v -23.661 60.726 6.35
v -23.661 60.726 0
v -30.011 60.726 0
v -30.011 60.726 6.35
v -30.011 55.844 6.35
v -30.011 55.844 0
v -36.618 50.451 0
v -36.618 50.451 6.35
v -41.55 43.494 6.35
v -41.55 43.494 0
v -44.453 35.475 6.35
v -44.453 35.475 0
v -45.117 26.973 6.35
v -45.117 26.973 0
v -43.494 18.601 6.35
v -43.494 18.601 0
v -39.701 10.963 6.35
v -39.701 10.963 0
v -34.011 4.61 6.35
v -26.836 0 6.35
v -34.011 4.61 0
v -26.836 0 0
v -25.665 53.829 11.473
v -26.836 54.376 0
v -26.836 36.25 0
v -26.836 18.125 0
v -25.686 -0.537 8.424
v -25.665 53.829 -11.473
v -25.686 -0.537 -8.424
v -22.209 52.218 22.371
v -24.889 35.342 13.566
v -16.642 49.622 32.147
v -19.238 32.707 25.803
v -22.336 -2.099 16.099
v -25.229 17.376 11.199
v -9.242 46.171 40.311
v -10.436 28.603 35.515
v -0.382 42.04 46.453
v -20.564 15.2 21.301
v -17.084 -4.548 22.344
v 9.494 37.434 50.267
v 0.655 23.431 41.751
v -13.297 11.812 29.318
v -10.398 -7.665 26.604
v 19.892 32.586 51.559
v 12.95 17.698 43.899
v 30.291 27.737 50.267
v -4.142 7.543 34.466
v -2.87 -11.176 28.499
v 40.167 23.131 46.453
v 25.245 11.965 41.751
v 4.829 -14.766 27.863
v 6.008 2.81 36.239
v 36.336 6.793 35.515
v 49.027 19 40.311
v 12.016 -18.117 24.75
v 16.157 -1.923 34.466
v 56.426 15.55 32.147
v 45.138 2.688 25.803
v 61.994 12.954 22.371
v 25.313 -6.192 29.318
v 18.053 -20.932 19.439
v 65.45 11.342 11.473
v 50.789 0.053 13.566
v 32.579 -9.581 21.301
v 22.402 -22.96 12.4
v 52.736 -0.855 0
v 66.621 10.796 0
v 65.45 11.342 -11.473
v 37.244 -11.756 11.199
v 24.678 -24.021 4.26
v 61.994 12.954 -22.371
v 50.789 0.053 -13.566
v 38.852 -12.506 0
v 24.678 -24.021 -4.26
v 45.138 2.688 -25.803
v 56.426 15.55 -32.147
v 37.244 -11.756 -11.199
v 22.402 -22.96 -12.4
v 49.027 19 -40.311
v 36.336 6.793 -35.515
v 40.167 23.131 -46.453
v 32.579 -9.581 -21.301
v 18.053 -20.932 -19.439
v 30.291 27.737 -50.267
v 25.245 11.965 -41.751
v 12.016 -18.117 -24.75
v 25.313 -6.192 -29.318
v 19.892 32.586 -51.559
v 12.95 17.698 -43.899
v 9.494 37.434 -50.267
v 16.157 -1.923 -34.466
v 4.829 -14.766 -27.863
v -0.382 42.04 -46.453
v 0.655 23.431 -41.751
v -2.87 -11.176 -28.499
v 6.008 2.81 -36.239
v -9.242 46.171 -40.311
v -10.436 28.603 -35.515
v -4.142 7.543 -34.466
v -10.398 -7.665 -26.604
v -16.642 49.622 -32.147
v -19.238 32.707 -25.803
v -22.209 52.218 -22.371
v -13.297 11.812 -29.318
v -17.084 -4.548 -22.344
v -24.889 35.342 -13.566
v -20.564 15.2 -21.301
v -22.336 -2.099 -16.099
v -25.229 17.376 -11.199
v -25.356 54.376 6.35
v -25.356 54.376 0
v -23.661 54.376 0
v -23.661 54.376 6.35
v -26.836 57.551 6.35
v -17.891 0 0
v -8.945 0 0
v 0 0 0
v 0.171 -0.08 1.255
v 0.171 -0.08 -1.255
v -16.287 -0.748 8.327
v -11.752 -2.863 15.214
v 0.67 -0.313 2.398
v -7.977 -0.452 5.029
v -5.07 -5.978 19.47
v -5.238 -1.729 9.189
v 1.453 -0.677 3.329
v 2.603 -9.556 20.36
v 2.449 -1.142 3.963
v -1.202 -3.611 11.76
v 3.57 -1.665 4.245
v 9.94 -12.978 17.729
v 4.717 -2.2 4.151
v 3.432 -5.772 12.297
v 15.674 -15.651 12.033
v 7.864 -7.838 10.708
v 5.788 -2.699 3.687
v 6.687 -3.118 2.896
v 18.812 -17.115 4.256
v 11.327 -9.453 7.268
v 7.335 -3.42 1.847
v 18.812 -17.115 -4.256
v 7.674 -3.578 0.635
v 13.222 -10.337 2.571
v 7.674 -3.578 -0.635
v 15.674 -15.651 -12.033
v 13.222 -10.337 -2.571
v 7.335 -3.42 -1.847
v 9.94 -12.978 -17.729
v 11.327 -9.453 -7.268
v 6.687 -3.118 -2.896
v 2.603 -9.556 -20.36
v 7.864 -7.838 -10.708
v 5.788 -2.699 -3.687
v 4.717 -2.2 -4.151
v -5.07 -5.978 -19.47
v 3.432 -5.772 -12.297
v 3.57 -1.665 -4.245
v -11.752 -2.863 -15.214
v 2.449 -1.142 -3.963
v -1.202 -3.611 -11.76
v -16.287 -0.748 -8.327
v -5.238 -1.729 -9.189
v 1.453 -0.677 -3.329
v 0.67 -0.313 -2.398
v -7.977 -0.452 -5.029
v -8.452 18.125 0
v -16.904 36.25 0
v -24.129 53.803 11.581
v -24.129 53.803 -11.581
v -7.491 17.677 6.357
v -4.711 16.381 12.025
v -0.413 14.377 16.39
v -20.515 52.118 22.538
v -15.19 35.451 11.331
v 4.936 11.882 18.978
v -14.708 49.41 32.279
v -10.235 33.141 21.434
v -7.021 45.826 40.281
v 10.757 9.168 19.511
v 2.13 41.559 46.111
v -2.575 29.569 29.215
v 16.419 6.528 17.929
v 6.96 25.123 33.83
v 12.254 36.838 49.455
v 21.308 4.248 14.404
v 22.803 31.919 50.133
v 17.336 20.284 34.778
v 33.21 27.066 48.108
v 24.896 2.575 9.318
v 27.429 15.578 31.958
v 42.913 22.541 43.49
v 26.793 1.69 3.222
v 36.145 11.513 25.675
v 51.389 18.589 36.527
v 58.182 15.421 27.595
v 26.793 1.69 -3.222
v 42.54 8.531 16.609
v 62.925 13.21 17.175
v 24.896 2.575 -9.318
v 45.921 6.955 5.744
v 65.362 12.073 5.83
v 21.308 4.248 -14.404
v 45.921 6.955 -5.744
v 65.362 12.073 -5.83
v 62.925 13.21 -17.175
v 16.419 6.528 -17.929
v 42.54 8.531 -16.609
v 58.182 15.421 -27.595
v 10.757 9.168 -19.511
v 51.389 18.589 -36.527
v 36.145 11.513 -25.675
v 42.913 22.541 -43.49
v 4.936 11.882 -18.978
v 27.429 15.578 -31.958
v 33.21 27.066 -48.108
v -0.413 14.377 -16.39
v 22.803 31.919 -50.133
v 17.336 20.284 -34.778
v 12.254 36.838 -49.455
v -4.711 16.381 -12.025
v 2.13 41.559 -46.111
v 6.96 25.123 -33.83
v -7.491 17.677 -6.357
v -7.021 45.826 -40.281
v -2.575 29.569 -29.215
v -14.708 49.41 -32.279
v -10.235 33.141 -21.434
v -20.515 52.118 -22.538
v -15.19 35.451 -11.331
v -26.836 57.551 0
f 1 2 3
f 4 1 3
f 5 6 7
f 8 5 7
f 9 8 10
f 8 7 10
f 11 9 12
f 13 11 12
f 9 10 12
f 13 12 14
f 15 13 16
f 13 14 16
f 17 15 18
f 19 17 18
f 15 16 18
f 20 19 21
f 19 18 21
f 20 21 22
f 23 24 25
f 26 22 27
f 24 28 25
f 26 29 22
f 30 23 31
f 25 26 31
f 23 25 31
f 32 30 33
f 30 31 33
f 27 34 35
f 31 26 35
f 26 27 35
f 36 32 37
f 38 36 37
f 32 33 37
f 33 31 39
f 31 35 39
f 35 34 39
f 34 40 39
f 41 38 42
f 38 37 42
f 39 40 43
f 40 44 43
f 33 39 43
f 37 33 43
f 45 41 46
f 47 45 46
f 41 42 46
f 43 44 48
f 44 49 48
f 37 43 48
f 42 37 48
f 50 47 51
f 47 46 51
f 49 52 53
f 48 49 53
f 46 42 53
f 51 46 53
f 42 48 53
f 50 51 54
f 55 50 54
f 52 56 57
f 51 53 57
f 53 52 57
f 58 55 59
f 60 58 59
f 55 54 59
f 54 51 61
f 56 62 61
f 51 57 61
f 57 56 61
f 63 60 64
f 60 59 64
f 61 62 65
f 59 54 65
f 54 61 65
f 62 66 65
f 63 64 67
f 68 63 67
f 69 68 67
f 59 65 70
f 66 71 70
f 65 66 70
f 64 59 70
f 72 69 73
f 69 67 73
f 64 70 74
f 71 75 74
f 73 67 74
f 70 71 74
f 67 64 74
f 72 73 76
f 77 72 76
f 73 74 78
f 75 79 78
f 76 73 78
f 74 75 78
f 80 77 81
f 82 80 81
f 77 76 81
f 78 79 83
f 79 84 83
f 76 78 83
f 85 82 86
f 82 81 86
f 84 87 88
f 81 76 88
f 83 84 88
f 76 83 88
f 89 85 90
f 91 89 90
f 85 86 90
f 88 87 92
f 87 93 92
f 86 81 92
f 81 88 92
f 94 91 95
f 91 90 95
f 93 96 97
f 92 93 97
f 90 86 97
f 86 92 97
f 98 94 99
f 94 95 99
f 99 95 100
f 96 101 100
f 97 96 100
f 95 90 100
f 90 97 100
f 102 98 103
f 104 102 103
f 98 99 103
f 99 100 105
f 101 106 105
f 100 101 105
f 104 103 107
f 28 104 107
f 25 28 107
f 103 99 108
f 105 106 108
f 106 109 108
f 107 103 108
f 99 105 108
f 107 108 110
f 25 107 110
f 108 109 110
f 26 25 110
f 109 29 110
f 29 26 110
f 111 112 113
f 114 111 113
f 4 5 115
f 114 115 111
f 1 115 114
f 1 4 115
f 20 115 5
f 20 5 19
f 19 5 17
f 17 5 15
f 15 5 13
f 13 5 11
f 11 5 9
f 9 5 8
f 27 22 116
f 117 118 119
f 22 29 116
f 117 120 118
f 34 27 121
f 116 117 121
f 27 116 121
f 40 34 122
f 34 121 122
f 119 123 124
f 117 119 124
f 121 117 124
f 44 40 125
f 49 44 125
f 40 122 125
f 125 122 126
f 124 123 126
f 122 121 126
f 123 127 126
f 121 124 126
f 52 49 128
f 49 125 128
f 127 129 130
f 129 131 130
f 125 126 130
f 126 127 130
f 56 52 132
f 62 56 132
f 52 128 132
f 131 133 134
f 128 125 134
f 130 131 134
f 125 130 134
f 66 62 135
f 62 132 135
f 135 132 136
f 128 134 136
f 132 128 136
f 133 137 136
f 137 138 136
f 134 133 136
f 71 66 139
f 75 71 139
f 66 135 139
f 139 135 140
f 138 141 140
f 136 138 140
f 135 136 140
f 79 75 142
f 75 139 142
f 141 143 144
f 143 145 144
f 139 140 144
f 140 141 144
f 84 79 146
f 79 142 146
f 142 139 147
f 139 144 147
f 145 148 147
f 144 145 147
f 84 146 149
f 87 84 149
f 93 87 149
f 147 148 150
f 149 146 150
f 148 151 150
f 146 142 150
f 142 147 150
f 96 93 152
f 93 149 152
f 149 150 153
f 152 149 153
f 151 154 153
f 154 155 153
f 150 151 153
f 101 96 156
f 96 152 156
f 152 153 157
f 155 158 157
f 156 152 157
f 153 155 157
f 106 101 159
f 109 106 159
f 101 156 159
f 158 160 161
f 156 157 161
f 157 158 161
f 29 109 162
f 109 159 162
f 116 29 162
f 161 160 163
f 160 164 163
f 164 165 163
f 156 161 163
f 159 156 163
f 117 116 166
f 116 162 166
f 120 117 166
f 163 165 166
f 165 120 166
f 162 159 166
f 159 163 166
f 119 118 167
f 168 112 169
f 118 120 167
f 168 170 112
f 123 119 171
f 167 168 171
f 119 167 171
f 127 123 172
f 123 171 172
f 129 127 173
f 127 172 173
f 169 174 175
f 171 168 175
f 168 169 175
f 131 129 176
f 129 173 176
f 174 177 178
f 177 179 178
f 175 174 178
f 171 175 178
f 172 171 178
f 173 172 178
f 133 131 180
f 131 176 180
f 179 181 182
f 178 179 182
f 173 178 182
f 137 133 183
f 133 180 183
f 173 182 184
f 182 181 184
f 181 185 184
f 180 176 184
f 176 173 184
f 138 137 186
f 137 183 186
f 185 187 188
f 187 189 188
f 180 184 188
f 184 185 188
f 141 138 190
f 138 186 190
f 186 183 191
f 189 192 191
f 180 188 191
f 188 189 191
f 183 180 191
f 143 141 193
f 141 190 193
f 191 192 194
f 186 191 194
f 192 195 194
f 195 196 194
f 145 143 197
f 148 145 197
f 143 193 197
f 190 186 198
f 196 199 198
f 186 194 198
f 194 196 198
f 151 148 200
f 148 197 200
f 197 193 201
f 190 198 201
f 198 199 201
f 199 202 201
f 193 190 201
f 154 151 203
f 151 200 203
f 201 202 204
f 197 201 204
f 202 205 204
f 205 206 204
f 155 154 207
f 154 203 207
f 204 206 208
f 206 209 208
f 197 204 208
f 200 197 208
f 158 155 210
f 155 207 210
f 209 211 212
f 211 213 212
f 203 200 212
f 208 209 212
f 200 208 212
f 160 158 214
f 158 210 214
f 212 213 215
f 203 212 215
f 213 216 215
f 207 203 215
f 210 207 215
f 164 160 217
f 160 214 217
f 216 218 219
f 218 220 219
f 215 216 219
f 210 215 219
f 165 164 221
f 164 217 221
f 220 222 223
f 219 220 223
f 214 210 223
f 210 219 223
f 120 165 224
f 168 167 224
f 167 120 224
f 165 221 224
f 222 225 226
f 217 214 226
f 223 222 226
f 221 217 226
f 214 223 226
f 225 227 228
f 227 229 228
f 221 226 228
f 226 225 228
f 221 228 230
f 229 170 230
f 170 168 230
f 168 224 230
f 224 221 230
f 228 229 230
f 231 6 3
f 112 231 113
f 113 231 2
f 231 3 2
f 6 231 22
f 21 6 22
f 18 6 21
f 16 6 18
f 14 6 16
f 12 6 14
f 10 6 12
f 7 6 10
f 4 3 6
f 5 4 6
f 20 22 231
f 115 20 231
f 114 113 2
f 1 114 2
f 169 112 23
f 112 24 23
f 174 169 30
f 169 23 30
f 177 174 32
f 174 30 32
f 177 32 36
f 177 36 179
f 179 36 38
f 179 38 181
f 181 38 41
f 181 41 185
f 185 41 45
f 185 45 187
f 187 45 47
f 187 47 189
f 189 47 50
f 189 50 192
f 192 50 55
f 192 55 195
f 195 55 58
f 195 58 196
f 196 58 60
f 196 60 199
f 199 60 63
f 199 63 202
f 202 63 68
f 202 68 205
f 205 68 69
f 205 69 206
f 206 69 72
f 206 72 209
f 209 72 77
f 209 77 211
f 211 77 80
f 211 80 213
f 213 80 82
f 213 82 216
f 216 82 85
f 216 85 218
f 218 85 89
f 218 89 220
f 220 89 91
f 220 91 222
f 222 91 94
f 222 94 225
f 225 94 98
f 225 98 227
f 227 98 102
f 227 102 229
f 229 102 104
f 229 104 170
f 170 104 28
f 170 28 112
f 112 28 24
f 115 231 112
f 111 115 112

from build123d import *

# Parameters (mm, degrees)
F1_DEPTH = 6.35


with BuildPart() as f1:
    # F0 (on Top) → F1 (new body)
    with BuildSketch(Plane.XY):
        with BuildLine():
            ThreePointArc((-30.01126, 55.844268), (-45.116939, 26.973051), (-26.83626, 0))
            Line((-26.83626, 0), (-26.83626, 54.375544))
            Line((-26.83626, 54.375544), (-30.01126, 54.375544))
            Line((-30.01126, 54.375544), (-30.01126, 55.844268))
        make_face()
        with BuildLine():
            Line((-26.83626, 54.375544), (-26.83626, 57.550544))
            ThreePointArc((-26.83626, 57.550544), (-28.447992, 56.742498), (-30.01126, 55.844268))
            Line((-30.01126, 55.844268), (-30.01126, 54.375544))
            Line((-30.01126, 54.375544), (-26.83626, 54.375544))
        make_face()
        with BuildLine():
            Line((-26.83626, 57.550544), (-25.355733, 54.375544))
            Line((-25.355733, 54.375544), (-23.66126, 54.375544))
            Line((-23.66126, 54.375544), (-23.66126, 60.725544))
            Line((-23.66126, 60.725544), (-30.01126, 60.725544))
            Line((-30.01126, 60.725544), (-30.01126, 55.844268))
            ThreePointArc((-30.01126, 55.844268), (-28.447992, 56.742498), (-26.83626, 57.550544))
        make_face()
    extrude(amount=F1_DEPTH)


with BuildPart() as f2:
    # F0 (on Top) → F2 (revolve)
    with BuildSketch(Plane.XY):
        Polygon((-26.83626, 0), (0, 0), (-25.355733, 54.375544), (-26.83626, 54.375544), align=None)
    revolve(axis=Axis((21.35777, 35.728059, 0), (0.422618, 0.906308, 0)))


solid = Compound([f1.part, f2.part])
